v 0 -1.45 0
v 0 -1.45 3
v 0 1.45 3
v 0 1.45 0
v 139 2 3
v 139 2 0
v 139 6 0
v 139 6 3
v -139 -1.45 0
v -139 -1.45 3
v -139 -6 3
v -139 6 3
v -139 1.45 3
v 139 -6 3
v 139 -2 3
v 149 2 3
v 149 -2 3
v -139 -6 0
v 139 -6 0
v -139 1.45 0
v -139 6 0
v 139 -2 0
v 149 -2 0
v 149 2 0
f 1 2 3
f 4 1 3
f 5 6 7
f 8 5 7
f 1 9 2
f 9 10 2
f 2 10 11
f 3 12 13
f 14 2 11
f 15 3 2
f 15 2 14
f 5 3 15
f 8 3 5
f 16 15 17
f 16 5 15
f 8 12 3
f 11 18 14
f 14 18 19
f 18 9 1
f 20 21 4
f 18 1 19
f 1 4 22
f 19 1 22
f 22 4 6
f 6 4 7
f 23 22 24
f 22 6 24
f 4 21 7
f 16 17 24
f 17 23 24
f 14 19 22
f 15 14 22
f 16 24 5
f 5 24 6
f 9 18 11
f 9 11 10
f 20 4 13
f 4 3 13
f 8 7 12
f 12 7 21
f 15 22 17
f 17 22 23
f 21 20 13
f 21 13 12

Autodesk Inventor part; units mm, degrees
ref_plane "YZ Plane" through (0, 0, 0) normal (1, 0, 0) x (0, 1, 0)
ref_plane "XY Plane" through (0, 0, 0) normal (0, 0, 1) x (1, 0, 0)
sketch "草圖1" plane through (0, 0, 0) normal (0, 0, 1) x (1, 0, 0)
  line L0 (0, 6) -> (0, -6)
  line L1 (0, -6) -> (-139, -6)
  line L2 (-139, -6) -> (-139, 6)
  line L3 (-149, 2) -> (-139, 2)
  line L4 (-139, 2) -> (-139, -2)
  line L5 (-139, -2) -> (-149, -2)
  line L6 (-149, -2) -> (-149, 2)
  line L7 (0, -9.6) -> (0, 15.6)
  line L8 (-148, -2) -> (-139, -2)
  line L9 (-139, -2) -> (-139, -6)
  line L10 (-139, 6) -> (-139, -2)
  line L11 (-139, -2) -> (-148, -2)
  line L12 (-139, 6) -> (0, 6)
  line L13 (139, -6) -> (139, 6)
  line L14 (139, 6) -> (139, -2)
  line L15 (139, -2) -> (139, -6)
  line L16 (139, -2) -> (148, -2)
  line L17 (149, 2) -> (139, 2)
  line L18 (148, -2) -> (139, -2)
  line L19 (139, -2) -> (149, -2)
  line L20 (149, -2) -> (149, 2)
  line L21 (139, 2) -> (139, -2)
  line L22 (0, -6) -> (139, -6)
  line L23 (139, 6) -> (0, 6)
  point P0 (0, 0)
  point P1 (0, 0)
  point P2 (0, 0)
  point P3 (-139, 6)
  point P4 (-139, -2)
  point P5 (-148, 2)
  point P6 (139, -2)
  point P7 (139, 6)
  point P8 (139, 6)
  point P9 (139, -2)
  point P10 (139, -2)
  dimension "d0" = 10
  dimension "d1" = 139
  dimension "d2" = 4
  dimension "d6" = 6
  dimension "d7" = 6
  dimension "d8" = 8
  dimension "d9" = 4
  dimension "d14" = 12
extrude "擠出1" add sketch "草圖1" along normal blind 3
ref_plane "工作平面1" through (0, 0, 1.5) normal (0, 0, -1) x (-1, 0, 0)
sketch "草圖3" plane through (0, 0, 3) normal (0, 0, 1) x (1, 0, 0)
  line L0 (0, 1.45) -> (-139, 1.45)
  line L1 (-139, 1.45) -> (-139, -1.45)
  line L2 (-139, -1.45) -> (0, -1.45)
  line L3 (0, -1.45) -> (0, 1.45)
  line L4 (-139, -2) -> (-139, -6) projected
  line L5 (-139, 6) -> (-139, 2) projected
  line L6 (-149, -2) -> (-139, -2) projected
  line L7 (-139, 2) -> (-149, 2)
  line L8 (-149, 2) -> (-149, -2)
  line L9 (-149, -2) -> (-139, -2)
  line L10 (-139, -2) -> (-139, 2)
  point P0 (0, 0)
  point P1 (0, 0)
  dimension "d15" = 2.9
extrude "擠出3" cut sketch "草圖3" against normal blind 10
equation "\"d9\" = -0.5 * d2 + 0.5 * d14"
properties part number "rod_5"
